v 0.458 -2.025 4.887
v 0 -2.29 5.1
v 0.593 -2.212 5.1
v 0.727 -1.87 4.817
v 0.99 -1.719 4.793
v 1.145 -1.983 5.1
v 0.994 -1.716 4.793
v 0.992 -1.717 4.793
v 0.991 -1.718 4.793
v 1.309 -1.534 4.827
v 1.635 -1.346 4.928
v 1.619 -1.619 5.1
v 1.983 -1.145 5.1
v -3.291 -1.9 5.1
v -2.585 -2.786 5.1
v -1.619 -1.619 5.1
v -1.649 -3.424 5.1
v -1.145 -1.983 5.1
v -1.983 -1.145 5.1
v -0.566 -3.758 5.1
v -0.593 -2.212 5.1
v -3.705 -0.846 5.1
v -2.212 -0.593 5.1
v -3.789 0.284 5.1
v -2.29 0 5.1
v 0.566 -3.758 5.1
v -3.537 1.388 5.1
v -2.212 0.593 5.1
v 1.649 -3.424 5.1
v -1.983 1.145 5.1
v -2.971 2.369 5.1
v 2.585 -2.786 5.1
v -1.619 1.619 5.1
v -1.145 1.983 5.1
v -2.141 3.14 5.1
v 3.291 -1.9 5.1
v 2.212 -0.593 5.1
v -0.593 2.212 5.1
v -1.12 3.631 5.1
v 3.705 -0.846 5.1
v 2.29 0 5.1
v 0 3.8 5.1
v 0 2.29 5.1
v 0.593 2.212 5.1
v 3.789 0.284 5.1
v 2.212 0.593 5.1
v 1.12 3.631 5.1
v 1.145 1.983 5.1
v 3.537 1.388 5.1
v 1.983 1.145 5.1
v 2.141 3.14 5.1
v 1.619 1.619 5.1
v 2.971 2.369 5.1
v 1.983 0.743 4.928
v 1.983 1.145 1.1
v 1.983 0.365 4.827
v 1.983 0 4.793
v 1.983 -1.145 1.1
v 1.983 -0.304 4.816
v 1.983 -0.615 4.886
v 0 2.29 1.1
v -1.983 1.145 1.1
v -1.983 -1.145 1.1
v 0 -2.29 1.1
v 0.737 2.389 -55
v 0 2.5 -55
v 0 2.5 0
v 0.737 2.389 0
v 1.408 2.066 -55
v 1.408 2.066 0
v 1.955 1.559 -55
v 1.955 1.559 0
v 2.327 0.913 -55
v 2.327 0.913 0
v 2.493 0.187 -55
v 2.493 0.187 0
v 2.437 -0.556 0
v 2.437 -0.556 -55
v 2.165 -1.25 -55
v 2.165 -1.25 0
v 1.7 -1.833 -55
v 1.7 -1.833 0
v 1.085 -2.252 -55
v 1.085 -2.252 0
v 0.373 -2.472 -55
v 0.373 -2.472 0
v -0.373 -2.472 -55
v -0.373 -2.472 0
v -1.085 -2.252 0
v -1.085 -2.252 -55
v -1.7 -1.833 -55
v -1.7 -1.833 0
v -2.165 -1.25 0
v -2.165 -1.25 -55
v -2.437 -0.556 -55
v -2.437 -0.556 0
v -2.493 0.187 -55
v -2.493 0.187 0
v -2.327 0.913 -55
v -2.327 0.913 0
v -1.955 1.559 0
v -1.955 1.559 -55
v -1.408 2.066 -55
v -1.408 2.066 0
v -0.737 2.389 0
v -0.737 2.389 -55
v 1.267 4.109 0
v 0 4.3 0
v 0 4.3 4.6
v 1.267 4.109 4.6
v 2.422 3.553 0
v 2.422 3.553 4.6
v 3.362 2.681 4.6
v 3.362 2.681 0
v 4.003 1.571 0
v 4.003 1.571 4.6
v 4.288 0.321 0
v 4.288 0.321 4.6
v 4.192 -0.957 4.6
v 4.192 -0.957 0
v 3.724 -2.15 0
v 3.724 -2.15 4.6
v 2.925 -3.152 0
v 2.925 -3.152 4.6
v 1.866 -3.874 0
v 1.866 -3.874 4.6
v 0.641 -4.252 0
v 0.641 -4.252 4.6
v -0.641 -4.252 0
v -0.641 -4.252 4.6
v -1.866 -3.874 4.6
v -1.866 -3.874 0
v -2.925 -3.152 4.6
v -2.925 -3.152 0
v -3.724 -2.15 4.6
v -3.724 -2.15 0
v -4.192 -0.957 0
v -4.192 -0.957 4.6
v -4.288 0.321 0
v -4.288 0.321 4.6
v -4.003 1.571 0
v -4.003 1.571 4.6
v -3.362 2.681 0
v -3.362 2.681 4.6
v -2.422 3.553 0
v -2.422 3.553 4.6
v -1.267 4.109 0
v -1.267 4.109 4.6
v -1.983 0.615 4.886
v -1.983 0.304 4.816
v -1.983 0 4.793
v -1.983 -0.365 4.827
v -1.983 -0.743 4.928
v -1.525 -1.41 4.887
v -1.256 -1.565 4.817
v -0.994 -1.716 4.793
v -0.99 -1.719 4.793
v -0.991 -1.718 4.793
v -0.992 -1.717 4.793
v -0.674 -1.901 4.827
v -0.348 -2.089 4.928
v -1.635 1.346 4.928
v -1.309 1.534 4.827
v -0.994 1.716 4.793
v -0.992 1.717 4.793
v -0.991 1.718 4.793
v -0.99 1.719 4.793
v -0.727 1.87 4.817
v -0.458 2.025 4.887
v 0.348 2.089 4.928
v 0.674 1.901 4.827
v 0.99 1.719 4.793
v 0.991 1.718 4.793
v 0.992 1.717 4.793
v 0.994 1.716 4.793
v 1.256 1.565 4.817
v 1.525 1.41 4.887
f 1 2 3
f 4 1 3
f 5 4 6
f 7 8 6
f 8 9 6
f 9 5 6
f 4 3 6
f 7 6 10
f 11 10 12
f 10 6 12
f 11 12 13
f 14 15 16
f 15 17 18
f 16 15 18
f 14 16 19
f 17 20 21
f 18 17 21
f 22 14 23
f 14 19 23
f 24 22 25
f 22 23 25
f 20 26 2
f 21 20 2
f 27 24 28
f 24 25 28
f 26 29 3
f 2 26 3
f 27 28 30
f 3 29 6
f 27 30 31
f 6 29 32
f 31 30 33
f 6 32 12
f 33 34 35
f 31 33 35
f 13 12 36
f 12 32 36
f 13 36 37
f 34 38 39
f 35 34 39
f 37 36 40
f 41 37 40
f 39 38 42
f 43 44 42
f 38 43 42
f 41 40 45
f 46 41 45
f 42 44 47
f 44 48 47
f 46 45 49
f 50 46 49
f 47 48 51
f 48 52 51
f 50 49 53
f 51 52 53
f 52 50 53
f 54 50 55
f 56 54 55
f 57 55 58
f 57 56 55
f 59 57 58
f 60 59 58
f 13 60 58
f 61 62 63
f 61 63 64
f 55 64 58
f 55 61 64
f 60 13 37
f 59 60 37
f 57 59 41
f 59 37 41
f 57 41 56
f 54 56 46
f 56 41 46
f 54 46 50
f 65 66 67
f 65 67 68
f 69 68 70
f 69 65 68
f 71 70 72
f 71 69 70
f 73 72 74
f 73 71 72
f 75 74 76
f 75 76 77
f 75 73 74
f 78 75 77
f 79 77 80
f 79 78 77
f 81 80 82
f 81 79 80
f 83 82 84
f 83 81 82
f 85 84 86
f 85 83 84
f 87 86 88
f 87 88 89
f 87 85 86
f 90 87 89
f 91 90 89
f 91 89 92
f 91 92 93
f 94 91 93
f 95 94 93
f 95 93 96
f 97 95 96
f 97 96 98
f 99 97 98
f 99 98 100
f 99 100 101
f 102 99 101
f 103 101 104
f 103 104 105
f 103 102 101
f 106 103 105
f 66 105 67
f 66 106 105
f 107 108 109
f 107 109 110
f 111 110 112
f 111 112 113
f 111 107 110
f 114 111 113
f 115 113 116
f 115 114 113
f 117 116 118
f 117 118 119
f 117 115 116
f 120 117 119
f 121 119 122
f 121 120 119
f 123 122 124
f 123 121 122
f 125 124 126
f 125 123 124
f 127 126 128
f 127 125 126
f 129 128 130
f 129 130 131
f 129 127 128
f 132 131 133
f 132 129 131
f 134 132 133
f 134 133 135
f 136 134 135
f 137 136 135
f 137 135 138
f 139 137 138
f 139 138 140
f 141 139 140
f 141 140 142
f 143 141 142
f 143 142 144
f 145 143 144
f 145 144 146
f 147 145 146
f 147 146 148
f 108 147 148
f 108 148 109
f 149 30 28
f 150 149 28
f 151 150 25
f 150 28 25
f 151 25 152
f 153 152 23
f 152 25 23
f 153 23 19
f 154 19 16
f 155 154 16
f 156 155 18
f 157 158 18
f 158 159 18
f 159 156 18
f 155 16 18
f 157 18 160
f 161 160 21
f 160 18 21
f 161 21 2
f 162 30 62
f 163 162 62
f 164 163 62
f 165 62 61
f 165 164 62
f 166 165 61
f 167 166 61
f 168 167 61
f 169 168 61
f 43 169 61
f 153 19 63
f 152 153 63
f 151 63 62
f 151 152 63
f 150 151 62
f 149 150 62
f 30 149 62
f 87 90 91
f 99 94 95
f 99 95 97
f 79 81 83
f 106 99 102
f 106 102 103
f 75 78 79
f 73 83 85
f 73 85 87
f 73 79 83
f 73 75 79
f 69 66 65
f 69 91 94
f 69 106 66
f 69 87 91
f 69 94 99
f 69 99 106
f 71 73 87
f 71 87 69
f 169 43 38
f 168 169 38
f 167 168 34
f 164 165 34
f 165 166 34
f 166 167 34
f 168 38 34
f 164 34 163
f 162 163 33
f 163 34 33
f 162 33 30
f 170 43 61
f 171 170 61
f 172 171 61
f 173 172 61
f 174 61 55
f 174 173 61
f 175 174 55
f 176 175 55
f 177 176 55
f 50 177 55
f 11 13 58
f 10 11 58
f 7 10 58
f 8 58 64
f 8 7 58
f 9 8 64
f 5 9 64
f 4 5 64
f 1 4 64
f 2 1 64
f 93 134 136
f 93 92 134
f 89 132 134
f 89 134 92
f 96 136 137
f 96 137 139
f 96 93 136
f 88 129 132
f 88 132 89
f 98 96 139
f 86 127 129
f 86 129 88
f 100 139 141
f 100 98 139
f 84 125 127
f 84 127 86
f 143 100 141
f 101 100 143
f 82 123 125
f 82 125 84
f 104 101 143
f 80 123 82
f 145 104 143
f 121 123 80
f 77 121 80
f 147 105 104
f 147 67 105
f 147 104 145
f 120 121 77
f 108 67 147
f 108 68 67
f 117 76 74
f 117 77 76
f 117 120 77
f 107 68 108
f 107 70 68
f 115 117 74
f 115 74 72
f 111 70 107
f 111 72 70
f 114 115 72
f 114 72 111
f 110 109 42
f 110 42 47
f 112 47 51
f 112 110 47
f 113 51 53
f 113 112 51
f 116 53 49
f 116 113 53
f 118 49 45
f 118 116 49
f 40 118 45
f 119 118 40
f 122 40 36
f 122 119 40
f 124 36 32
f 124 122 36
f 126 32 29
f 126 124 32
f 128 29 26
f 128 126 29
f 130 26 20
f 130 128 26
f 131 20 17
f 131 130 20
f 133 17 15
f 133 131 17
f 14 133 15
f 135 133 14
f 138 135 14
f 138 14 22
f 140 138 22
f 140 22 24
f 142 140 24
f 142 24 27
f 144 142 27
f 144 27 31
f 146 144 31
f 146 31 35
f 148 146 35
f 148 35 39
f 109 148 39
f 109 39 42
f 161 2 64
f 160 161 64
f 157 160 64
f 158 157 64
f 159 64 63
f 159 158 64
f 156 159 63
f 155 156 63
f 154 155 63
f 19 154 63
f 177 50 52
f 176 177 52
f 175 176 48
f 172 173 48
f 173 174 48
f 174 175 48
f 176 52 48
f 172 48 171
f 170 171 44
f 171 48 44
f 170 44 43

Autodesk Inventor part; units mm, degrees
ref_plane "YZ Plane" through (0, 0, 0) normal (1, 0, 0) x (0, 1, 0)
ref_plane "XZ Plane" through (0, 0, 0) normal (0, 1, 0) x (-1, 0, 0)
ref_plane "XY Plane" through (0, 0, 0) normal (0, 0, 1) x (1, 0, 0)
sketch "スケッチ1" plane through (0, 0, 0) normal (1, 0, 0) x (0, 1, 0)
  line L0 (4.3, 5.1) -> (4.3, 0)
  line L1 (4.3, 0) -> (2.5, 0)
  line L2 (2.5, 0) -> (2.5, -55)
  line L3 (0, -55) -> (2.5, -55)
  line L4 (4.3, 5.1) -> (0, 5.1)
  line L5 (0, 5.1) -> (0, -55)
  point P0 (0, 0)
  dimension "d2" = 0
  dimension "d3" = 55
  dimension "d4" = 4.3
  dimension "d5" = 5.1
  dimension "d6" = 0
  dimension "d7" = 2.5
revolve "回転1" add sketch "スケッチ1" angle 360 about axis through (0, 0, 5.1) along (0, 0, -1)
chamfer "面取り1" distance 0.5 angle 45 1 edges at (0, -4.3, 5.1)
sketch "スケッチ2" plane through (0, 0, 5.1) normal (0, 0, 1) x (1, 0, 0)
  circle A0 centre (0, 0) radius 2.29
  line L0 (0, 0) -> (-2.9175, 1.6844)
  line L1 (0, 0) -> (-1.7508, 0)
  point P0 (0, 0)
  point P1 (-1.9832, 1.145)
  point P2 (-1.9832, -1.145)
  point P3 (0, -2.29)
  point P4 (1.9832, -1.145)
  point P5 (1.9832, 1.145)
  point P6 (0, 2.29)
  dimension "d12" = 4.58
  dimension "d14" = 30
  dimension "d21" = 360
sketch "スケッチ3" plane through (0, 0, 5.1) normal (0, 0, 1) x (1, 0, 0)
  line L0 (-1.9832, 1.145) -> (0, 2.29)
  line L1 (0, 2.29) -> (1.9832, 1.145)
  line L2 (1.9832, 1.145) -> (1.9832, -1.145)
  line L3 (1.9832, -1.145) -> (0, -2.29)
  line L4 (0, -2.29) -> (-1.9832, -1.145)
  line L5 (-1.9832, -1.145) -> (-1.9832, 1.145)
  point P0 (0, 0)
  point P1 (-2.5, -1.3891)
extrude "押し出し1" cut sketch "スケッチ3" against normal blind 4
thread "ねじ1" size "M6x1" class "6g" standard "ANSI Metric M Profile" length 30
sketch "スケッチ4" plane through (0, 0, 0) normal (0, 1, 0) x (-1, 0, 0)
  line L0 (-3.8, 5.1) -> (3.8, 5.1) projected
  line L1 (0, 5.1) -> (0, 1.1) projected
  line L2 (2.29, 5.1) -> (1.9832, 4.7932)
  line L3 (1.9832, 5.1) -> (1.9832, 1.1) projected
  line L4 (1.9832, 5.1) -> (2.29, 5.1)
  point P0 (0, 0)
  dimension "d27" = 2.29
  dimension "d28" = 45
revolve "回転2" cut sketch "スケッチ4" angle 360 about axis through (0, 0, 5.1) along (0, 0, -1)
properties part number "CB5-55" material "鋼、炭素鋼"
